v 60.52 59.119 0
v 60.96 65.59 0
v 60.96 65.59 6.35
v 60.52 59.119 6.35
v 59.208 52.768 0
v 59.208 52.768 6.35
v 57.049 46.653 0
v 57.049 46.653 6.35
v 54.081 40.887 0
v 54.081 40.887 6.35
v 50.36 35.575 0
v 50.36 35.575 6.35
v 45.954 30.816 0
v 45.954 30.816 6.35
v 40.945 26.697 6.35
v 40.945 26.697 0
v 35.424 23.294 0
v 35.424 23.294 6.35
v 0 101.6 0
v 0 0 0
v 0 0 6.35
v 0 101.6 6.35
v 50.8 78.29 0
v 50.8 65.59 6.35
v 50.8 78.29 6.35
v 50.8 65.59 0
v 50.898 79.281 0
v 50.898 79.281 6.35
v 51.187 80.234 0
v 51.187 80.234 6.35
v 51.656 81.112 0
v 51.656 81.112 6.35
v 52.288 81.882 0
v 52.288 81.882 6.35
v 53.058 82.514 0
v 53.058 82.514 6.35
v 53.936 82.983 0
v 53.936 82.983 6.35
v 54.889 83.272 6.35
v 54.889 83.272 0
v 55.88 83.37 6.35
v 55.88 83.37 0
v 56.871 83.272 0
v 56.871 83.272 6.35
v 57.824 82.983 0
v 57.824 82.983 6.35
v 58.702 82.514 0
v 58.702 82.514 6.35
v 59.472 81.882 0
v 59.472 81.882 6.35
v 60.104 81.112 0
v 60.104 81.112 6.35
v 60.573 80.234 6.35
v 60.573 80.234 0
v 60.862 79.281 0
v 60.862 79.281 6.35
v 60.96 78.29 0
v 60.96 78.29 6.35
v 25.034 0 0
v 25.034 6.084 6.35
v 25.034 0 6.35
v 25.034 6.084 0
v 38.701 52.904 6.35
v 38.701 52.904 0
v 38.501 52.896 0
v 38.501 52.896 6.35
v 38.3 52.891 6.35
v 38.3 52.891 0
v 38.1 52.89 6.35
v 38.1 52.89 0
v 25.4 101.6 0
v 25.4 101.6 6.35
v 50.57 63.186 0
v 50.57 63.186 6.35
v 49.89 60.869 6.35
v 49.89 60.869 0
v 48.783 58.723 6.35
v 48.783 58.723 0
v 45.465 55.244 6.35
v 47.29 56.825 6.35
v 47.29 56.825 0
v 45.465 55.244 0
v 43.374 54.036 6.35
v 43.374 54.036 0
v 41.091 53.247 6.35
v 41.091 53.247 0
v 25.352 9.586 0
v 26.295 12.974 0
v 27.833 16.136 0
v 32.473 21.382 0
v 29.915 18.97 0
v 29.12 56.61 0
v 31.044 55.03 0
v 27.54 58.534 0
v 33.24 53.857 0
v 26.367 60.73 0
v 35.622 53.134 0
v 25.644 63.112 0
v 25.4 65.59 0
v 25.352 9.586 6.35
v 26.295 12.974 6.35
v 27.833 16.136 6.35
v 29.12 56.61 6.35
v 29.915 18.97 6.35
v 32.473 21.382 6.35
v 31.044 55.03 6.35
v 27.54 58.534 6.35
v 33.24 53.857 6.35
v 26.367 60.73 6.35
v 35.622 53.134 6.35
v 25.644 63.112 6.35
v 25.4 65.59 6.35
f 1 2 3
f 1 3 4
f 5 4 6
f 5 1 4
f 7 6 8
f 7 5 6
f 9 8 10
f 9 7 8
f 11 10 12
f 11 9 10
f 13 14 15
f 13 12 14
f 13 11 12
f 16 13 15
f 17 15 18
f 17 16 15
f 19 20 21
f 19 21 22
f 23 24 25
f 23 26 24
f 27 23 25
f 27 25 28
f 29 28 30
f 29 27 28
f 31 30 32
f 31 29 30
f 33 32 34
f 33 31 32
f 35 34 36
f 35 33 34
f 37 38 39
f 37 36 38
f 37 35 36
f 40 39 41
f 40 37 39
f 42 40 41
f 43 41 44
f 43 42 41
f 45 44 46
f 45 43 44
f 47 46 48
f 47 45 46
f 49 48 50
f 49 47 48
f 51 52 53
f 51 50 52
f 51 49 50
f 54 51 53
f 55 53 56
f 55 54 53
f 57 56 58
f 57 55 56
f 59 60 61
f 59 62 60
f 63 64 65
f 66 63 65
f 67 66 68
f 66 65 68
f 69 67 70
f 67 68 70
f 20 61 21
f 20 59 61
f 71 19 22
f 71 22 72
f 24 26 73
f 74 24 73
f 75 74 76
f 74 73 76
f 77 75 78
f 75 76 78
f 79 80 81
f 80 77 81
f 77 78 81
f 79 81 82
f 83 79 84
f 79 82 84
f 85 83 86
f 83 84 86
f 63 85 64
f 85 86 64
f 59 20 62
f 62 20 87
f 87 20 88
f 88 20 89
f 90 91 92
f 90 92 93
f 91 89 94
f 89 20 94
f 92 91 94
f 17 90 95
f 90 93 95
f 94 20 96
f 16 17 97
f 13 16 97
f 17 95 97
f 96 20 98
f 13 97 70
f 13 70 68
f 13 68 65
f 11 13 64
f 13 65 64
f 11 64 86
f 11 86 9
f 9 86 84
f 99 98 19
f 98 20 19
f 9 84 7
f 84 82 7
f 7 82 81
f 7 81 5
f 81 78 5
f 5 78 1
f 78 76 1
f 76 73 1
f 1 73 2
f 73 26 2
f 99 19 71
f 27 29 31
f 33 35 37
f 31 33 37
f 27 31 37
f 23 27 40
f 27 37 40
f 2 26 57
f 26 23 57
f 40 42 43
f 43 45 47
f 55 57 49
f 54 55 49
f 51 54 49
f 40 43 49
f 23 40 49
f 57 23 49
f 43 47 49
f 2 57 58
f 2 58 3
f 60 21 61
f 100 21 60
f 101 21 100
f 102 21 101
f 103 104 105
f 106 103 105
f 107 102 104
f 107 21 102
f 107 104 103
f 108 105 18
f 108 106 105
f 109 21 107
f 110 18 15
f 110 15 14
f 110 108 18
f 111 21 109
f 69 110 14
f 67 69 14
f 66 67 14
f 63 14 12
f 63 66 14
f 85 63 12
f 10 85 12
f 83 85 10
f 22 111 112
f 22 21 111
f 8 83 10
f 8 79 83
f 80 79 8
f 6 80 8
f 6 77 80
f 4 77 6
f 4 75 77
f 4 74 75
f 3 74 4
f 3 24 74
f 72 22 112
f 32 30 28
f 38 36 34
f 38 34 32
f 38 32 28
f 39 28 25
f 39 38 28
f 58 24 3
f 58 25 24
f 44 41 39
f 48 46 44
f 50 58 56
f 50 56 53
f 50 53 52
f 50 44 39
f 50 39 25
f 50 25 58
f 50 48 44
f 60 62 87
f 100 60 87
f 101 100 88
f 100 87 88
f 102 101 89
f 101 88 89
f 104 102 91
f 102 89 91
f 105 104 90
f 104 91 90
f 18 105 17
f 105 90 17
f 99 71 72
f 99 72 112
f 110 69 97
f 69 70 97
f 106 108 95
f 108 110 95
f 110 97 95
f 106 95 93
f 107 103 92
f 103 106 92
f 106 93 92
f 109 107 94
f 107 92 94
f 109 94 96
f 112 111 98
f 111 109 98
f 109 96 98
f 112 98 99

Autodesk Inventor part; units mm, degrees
ref_plane "YZ Plane" through (0, 0, 0) normal (1, 0, 0) x (0, 1, 0)
ref_plane "XZ Plane" through (0, 0, 0) normal (0, 1, 0) x (-1, 0, 0)
ref_plane "XY Plane" through (0, 0, 0) normal (0, 0, 1) x (1, 0, 0)
sketch "Sketch1" plane through (0, 0, 0) normal (0, 0, 1) x (1, 0, 0)
  line L0 (0, 0) -> (0, 101.6)
  line L1 (0, 101.6) -> (25.4, 101.6)
  line L2 (25.4, 101.6) -> (25.4, 65.5898)
  line L3 (50.8, 65.5898) -> (50.8, 78.2898)
  line L4 (60.96, 78.2898) -> (60.96, 65.5898)
  line L5 (25.0337, 0) -> (0, 0)
  arc A0 (38.1, 52.8898) -> (50.8, 65.5898) centre (38.1, 65.5898) ccw
  arc A1 (25.4, 65.5898) -> (38.7011, 52.904) centre (38.1, 65.5898) ccw
  arc A2 (60.96, 78.2898) -> (50.8, 78.2898) centre (55.88, 78.2898) ccw
  line L6 (25.4, 65.5898) -> (50.8, 65.5898) construction
  arc A3 (35.4242, 23.2943) -> (60.96, 65.5898) centre (13.1646, 65.5898) ccw
  arc A4 (35.4242, 23.2943) -> (25.0337, 6.0842) centre (44.4817, 6.0842) ccw
  line L7 (25.0337, 6.0842) -> (25.0337, 0)
  dimension "d0" = 101.6
  dimension "d2" = 25.4
  dimension "d4" = 25.4
  dimension "d6" = 10.16
  dimension "d9" = 12.7
  dimension "d10" = 12.7
  dimension "d13" = 60.96
extrude "Extrusion1" add sketch "Sketch1" along normal blind 6.35
properties part number "Can Hook"
